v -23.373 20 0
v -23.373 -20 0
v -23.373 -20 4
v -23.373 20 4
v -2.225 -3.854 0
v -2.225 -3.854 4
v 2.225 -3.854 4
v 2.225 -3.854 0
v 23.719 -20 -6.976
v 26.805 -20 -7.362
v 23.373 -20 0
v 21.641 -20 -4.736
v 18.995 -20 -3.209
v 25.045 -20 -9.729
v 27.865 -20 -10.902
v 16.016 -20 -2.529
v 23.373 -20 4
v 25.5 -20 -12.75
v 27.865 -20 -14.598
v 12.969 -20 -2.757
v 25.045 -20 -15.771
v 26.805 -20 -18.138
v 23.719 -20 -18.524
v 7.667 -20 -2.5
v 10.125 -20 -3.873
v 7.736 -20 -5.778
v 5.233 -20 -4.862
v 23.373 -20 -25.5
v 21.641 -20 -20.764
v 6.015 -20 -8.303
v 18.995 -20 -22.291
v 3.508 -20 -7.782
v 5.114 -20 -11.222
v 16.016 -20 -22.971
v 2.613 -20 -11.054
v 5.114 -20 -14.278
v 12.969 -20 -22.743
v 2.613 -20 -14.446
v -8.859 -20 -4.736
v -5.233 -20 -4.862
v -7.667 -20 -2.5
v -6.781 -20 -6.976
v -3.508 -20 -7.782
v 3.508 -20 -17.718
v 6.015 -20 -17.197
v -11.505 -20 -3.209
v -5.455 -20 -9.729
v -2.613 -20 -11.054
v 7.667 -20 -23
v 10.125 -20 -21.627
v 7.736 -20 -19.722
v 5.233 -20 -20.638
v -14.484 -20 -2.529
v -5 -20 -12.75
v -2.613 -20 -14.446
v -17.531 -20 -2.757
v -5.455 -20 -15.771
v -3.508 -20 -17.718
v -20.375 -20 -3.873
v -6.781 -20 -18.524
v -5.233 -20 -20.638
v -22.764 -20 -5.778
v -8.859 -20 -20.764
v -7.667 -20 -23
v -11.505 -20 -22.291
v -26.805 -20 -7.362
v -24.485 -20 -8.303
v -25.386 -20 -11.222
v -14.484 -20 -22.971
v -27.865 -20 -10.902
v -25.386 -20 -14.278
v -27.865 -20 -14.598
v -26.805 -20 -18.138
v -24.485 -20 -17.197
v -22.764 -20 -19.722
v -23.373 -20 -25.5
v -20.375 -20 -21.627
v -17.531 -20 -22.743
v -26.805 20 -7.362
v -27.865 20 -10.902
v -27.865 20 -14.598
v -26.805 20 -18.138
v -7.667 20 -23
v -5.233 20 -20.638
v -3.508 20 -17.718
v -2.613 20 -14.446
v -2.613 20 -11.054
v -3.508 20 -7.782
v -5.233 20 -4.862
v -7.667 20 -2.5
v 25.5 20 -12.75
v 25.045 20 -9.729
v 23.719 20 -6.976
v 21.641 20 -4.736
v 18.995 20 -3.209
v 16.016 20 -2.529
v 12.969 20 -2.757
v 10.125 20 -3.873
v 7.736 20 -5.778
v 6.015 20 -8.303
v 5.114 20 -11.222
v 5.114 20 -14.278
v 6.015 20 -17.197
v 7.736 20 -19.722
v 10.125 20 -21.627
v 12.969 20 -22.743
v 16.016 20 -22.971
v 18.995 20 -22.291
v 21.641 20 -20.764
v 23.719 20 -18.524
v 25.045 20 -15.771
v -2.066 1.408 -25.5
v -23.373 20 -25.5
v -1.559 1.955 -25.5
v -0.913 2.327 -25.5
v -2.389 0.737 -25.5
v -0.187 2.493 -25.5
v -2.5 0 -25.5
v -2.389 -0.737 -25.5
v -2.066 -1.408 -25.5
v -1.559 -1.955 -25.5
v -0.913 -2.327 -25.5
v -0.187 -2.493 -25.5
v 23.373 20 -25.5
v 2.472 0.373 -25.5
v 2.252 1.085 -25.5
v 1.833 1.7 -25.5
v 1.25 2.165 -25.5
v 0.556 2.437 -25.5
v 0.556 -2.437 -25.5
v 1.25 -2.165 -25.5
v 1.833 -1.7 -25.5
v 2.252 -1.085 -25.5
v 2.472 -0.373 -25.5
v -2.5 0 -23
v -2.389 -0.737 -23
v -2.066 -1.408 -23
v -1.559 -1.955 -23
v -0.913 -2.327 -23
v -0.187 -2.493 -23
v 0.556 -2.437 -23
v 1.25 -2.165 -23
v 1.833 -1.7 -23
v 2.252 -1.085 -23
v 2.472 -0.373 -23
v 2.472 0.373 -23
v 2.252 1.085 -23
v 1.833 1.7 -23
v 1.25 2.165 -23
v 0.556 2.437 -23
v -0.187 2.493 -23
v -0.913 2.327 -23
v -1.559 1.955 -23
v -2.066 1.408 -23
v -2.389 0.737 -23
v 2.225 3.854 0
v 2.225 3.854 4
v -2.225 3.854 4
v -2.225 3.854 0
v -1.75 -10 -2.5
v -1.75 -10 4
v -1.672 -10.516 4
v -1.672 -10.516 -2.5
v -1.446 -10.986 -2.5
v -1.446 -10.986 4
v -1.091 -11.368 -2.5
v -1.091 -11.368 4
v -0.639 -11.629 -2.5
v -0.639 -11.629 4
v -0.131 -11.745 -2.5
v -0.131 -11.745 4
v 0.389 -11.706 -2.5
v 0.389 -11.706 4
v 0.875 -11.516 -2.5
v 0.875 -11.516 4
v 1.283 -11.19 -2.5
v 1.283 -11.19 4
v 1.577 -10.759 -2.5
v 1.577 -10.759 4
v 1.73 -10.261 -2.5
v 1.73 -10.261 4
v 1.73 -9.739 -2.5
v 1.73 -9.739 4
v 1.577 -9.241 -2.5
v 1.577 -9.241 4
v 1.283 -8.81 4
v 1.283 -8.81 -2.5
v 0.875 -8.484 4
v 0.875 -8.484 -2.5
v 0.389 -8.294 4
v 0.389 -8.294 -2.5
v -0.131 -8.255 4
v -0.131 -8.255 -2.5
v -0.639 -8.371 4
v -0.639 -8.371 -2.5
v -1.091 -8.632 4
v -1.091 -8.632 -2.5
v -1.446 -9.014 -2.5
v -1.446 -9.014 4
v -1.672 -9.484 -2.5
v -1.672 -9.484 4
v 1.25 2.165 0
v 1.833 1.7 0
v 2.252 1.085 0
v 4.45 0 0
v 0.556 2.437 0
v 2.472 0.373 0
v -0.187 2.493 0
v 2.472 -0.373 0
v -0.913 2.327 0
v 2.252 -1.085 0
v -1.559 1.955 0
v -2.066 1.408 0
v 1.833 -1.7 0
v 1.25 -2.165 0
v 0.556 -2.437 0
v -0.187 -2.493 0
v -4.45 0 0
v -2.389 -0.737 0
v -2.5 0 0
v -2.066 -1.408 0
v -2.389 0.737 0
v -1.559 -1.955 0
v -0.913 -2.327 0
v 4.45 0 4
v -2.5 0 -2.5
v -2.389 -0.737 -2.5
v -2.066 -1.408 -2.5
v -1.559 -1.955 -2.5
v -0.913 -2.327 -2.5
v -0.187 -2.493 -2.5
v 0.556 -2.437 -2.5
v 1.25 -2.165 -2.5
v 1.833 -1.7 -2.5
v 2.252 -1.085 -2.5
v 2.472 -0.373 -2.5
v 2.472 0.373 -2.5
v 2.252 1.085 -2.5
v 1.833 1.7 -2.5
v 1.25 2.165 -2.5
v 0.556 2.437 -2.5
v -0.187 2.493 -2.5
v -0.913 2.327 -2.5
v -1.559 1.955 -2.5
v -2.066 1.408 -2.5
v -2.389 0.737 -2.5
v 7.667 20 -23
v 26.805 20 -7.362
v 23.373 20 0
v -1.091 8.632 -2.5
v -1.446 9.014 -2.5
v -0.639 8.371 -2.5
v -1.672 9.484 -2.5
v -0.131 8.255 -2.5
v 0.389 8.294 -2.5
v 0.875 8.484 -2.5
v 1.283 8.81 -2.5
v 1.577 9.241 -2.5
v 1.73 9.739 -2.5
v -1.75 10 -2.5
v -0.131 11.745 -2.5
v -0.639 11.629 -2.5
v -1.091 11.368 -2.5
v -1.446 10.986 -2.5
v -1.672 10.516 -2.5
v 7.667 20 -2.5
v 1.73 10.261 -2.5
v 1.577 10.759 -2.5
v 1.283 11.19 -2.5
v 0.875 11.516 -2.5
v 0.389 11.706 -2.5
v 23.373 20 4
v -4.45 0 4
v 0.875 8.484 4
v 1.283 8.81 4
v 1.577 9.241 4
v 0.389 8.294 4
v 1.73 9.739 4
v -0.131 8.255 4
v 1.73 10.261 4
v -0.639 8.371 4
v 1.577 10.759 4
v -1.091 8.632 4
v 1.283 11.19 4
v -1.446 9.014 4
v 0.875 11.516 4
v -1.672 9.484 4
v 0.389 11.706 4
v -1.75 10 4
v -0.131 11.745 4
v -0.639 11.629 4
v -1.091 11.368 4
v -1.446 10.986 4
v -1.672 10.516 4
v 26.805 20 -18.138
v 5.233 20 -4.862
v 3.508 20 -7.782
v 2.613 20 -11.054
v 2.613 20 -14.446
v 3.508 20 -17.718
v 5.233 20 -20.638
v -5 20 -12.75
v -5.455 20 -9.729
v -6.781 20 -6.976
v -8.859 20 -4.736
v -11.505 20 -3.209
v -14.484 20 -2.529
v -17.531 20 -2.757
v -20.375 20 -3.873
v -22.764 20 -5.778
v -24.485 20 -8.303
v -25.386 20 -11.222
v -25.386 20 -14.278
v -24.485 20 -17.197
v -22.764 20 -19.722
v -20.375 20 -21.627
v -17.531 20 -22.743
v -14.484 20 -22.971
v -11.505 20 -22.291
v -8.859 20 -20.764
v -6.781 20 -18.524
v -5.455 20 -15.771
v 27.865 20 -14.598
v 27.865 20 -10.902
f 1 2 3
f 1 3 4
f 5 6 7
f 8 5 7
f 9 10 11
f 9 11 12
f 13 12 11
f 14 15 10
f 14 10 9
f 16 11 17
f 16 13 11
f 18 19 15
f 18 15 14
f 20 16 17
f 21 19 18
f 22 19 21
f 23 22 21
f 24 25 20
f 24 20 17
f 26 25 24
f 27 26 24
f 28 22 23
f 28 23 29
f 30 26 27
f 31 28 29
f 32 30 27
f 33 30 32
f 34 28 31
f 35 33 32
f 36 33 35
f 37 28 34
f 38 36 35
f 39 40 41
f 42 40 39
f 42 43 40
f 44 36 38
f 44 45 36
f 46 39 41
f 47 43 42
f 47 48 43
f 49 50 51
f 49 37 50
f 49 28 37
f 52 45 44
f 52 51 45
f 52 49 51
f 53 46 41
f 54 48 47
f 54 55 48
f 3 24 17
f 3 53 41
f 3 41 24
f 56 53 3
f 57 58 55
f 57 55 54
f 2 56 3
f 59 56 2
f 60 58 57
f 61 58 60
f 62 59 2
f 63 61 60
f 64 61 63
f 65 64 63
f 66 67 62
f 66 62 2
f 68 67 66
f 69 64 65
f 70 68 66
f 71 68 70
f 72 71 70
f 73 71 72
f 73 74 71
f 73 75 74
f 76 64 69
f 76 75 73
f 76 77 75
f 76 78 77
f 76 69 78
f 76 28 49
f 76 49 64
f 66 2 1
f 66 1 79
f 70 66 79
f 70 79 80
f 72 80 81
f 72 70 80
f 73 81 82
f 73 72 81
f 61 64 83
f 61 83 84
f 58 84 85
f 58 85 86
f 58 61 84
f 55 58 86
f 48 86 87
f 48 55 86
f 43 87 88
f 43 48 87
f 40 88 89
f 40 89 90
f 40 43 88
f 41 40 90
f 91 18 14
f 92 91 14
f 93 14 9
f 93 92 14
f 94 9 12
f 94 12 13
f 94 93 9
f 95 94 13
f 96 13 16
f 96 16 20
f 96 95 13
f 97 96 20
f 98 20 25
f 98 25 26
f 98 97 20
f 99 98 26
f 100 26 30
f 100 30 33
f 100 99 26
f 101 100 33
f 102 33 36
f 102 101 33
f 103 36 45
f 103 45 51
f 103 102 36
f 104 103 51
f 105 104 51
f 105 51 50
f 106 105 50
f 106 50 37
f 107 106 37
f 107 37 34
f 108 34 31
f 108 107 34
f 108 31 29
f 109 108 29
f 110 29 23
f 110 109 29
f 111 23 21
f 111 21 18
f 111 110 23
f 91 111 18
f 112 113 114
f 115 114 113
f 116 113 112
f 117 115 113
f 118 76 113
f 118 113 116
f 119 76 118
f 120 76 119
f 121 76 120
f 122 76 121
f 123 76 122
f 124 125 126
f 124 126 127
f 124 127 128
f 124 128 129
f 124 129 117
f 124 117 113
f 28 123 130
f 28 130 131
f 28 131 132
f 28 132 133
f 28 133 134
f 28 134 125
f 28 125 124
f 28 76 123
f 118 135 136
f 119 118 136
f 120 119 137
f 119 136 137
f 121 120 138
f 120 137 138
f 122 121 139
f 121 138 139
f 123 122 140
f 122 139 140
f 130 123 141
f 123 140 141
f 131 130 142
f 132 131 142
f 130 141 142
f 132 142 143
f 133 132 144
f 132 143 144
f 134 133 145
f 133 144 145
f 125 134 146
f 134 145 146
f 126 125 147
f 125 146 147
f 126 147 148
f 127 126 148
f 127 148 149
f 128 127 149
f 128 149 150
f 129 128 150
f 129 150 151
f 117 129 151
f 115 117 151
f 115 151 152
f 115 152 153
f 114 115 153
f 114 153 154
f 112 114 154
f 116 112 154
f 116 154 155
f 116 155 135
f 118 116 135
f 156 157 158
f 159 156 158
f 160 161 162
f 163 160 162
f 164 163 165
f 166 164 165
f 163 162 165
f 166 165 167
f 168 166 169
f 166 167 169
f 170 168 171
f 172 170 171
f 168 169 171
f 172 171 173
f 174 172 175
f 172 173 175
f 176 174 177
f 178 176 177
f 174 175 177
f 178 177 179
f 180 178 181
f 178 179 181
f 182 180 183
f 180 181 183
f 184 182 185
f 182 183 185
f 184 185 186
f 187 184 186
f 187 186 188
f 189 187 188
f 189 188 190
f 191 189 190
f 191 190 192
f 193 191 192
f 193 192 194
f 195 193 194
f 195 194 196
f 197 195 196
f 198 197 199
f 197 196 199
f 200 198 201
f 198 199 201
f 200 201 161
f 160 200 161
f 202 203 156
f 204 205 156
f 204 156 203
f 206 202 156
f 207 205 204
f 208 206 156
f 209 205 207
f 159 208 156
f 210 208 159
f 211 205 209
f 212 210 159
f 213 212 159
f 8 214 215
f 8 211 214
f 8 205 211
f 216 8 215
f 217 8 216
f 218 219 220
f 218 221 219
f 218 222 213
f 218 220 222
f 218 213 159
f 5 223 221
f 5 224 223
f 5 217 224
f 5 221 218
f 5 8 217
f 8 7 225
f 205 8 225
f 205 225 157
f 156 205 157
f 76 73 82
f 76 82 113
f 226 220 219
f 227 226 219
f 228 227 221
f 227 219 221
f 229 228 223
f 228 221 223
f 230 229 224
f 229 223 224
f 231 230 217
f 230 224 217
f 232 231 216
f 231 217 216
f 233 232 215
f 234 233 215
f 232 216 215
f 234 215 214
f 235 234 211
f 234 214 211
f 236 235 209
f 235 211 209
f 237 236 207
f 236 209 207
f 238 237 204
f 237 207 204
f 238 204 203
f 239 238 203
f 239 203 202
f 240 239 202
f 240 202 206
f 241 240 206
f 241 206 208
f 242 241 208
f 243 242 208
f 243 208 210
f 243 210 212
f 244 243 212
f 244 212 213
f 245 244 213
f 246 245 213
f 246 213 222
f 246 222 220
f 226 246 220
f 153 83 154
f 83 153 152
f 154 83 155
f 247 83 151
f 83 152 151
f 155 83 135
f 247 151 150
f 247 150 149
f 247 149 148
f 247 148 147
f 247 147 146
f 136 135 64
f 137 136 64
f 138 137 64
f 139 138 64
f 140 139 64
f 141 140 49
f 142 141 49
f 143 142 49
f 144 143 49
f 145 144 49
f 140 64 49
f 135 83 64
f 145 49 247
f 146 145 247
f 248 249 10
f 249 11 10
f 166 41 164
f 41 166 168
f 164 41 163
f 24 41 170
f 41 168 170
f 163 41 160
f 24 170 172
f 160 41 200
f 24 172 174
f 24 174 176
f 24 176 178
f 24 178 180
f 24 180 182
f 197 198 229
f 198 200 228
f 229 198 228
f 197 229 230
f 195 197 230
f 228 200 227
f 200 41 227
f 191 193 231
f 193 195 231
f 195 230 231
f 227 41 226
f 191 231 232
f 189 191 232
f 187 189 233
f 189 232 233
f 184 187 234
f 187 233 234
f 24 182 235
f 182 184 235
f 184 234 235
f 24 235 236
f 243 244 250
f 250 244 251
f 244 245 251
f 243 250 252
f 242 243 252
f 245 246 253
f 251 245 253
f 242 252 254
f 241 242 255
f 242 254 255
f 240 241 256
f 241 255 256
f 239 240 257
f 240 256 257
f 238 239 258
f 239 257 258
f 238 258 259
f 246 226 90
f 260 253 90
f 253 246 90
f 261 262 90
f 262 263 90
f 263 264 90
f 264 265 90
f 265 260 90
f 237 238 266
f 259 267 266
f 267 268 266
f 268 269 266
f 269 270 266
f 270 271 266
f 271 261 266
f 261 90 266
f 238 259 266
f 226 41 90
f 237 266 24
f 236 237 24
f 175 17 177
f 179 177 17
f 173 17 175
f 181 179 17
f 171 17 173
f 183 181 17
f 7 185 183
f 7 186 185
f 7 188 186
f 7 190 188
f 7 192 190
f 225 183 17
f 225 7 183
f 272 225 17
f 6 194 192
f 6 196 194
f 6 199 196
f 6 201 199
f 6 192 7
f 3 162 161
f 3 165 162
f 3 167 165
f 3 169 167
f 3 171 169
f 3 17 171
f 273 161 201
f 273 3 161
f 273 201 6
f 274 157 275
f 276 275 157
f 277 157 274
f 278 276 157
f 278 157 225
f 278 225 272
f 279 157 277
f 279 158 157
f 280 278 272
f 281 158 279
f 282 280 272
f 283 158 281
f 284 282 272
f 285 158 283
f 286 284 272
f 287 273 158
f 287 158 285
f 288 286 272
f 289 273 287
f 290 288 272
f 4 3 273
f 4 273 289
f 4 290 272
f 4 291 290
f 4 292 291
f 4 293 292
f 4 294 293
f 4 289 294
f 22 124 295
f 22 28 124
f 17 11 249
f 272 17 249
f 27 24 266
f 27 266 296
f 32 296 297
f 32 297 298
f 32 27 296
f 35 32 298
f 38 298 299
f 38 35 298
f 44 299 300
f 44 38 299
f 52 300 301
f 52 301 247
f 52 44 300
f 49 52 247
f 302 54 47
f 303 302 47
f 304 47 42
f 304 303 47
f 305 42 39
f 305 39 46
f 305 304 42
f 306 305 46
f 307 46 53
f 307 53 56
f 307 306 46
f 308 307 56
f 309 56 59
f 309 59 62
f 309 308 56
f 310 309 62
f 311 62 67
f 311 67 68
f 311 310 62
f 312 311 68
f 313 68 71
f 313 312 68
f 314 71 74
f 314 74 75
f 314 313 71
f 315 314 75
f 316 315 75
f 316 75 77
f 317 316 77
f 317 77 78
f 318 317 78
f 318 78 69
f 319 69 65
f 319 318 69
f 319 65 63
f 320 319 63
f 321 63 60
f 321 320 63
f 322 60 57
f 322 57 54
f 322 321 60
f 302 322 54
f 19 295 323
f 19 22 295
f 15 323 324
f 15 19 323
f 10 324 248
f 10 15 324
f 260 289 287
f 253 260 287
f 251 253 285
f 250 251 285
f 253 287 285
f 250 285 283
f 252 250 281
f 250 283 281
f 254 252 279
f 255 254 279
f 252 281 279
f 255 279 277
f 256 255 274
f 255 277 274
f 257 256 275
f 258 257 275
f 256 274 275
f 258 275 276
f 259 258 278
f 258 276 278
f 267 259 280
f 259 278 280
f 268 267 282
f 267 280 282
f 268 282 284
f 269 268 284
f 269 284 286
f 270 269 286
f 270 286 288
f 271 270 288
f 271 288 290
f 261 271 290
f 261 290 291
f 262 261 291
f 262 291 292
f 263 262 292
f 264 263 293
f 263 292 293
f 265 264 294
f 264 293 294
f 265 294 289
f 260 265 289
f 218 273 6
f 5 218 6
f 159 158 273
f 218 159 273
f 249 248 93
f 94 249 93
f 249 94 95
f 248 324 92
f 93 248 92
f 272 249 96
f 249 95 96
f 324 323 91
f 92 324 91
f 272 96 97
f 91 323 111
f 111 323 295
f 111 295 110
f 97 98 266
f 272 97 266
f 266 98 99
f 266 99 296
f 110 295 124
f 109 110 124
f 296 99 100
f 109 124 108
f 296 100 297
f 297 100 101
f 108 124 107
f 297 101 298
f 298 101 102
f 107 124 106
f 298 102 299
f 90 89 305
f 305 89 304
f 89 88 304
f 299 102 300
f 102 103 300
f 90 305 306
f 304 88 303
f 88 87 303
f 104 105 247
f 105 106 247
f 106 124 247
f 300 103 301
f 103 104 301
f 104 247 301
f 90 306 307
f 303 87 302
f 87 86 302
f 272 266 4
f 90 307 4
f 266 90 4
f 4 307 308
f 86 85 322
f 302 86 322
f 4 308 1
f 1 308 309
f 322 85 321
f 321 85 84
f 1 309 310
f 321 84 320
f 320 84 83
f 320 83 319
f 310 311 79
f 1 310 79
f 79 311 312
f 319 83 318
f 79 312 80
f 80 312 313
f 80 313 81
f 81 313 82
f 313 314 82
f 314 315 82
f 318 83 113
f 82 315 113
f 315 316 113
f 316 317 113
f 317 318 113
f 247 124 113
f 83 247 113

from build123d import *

# Parameters (mm, degrees)
SKETCH021_R     = 10.25
PAD007_DEPTH    = 20
PAD007_FACE1_W  = 40
PAD007_FACE1_H  = 46.7452916506
PAD008_DEPTH    = 4
SKETCH022_R     = 1.75
POCKET007_DEPTH = 6.5
POCKET008_DEPTH = 4
SKETCH024_R     = 2.5
POCKET009_DEPTH = 29.501


with BuildPart() as part:
    # Sketch021 → Pad007 (new body, symmetric)
    with BuildSketch(Plane.XZ):
        with BuildLine():
            Line((23.3726458253, 0), (-23.3726458253, 0))
            Line((-23.3726458253, 0), (-26.8054242847, -7.3616171628))
            ThreePointArc((-26.8054242847, -7.3616171628), (-28, -12.75), (-26.8054242847, -18.1383828372))
            Line((-26.8054242847, -18.1383828372), (-23.3726458253, -25.5))
            Line((-23.3726458253, -25.5), (23.3726458253, -25.5))
            Line((23.3726458253, -25.5), (26.8054242847, -18.1383828372))
            ThreePointArc((26.8054242847, -18.1383828372), (28, -12.75), (26.8054242847, -7.3616171628))
            Line((23.3726458253, 0), (26.8054242847, -7.3616171628))
        make_face()
        with Locations((15.25, -12.75)):
            Circle(SKETCH021_R, mode=Mode.SUBTRACT)
        with Locations((-15.25, -12.75)):
            Circle(SKETCH021_R, mode=Mode.SUBTRACT)
        with BuildLine():
            Line((-7.6671245559, -2.5), (7.6671245559, -2.5))
            ThreePointArc((7.6671245559, -2.5), (2.5, -12.75), (7.6671245559, -23))
            Line((-7.6671245559, -23), (7.6671245559, -23))
            ThreePointArc((-7.6671245559, -23), (-2.5, -12.75), (-7.6671245559, -2.5))
        make_face(mode=Mode.SUBTRACT)
    extrude(amount=PAD007_DEPTH, both=True)

    # Pad007 Face1 → Pad008 (add)
    with BuildSketch(Plane(origin=(0, 0, 0), x_dir=(0, 1, 0), z_dir=(0, 0, 1))):
        Rectangle(PAD007_FACE1_W, PAD007_FACE1_H)
    extrude(amount=PAD008_DEPTH)

    # Sketch022 → Pocket007 (cut)
    with BuildSketch(Plane(origin=(0, 0, 4), x_dir=(-1, 0, 0), z_dir=(0, 0, 1))):
        with Locations((0, 10)):
            Circle(SKETCH022_R)
        with Locations((0, -10)):
            Circle(SKETCH022_R)
    extrude(amount=-POCKET007_DEPTH, mode=Mode.SUBTRACT)

    # Sketch023 (on Face6 of Pocket007) → Pocket008 (cut)
    with BuildSketch(Plane(origin=(0, 0, 4), x_dir=(-1, 0, 0), z_dir=(0, 0, 1))):
        Polygon((2.225, -3.8538130468), (4.45, 0), (2.225, 3.8538130468), (-2.225, 3.8538130468), (-4.45, 0), (-2.225, -3.8538130468), align=None)
    extrude(amount=-POCKET008_DEPTH, mode=Mode.SUBTRACT)

    # Sketch024 (on Face6 of Pocket008) → Pocket009 (cut, through all)
    with BuildSketch(Plane(origin=(0, 0, 4), x_dir=(-1, 0, 0), z_dir=(0, 0, 1))):
        Circle(SKETCH024_R)
    extrude(amount=-POCKET009_DEPTH, mode=Mode.SUBTRACT)


solid = part.part
